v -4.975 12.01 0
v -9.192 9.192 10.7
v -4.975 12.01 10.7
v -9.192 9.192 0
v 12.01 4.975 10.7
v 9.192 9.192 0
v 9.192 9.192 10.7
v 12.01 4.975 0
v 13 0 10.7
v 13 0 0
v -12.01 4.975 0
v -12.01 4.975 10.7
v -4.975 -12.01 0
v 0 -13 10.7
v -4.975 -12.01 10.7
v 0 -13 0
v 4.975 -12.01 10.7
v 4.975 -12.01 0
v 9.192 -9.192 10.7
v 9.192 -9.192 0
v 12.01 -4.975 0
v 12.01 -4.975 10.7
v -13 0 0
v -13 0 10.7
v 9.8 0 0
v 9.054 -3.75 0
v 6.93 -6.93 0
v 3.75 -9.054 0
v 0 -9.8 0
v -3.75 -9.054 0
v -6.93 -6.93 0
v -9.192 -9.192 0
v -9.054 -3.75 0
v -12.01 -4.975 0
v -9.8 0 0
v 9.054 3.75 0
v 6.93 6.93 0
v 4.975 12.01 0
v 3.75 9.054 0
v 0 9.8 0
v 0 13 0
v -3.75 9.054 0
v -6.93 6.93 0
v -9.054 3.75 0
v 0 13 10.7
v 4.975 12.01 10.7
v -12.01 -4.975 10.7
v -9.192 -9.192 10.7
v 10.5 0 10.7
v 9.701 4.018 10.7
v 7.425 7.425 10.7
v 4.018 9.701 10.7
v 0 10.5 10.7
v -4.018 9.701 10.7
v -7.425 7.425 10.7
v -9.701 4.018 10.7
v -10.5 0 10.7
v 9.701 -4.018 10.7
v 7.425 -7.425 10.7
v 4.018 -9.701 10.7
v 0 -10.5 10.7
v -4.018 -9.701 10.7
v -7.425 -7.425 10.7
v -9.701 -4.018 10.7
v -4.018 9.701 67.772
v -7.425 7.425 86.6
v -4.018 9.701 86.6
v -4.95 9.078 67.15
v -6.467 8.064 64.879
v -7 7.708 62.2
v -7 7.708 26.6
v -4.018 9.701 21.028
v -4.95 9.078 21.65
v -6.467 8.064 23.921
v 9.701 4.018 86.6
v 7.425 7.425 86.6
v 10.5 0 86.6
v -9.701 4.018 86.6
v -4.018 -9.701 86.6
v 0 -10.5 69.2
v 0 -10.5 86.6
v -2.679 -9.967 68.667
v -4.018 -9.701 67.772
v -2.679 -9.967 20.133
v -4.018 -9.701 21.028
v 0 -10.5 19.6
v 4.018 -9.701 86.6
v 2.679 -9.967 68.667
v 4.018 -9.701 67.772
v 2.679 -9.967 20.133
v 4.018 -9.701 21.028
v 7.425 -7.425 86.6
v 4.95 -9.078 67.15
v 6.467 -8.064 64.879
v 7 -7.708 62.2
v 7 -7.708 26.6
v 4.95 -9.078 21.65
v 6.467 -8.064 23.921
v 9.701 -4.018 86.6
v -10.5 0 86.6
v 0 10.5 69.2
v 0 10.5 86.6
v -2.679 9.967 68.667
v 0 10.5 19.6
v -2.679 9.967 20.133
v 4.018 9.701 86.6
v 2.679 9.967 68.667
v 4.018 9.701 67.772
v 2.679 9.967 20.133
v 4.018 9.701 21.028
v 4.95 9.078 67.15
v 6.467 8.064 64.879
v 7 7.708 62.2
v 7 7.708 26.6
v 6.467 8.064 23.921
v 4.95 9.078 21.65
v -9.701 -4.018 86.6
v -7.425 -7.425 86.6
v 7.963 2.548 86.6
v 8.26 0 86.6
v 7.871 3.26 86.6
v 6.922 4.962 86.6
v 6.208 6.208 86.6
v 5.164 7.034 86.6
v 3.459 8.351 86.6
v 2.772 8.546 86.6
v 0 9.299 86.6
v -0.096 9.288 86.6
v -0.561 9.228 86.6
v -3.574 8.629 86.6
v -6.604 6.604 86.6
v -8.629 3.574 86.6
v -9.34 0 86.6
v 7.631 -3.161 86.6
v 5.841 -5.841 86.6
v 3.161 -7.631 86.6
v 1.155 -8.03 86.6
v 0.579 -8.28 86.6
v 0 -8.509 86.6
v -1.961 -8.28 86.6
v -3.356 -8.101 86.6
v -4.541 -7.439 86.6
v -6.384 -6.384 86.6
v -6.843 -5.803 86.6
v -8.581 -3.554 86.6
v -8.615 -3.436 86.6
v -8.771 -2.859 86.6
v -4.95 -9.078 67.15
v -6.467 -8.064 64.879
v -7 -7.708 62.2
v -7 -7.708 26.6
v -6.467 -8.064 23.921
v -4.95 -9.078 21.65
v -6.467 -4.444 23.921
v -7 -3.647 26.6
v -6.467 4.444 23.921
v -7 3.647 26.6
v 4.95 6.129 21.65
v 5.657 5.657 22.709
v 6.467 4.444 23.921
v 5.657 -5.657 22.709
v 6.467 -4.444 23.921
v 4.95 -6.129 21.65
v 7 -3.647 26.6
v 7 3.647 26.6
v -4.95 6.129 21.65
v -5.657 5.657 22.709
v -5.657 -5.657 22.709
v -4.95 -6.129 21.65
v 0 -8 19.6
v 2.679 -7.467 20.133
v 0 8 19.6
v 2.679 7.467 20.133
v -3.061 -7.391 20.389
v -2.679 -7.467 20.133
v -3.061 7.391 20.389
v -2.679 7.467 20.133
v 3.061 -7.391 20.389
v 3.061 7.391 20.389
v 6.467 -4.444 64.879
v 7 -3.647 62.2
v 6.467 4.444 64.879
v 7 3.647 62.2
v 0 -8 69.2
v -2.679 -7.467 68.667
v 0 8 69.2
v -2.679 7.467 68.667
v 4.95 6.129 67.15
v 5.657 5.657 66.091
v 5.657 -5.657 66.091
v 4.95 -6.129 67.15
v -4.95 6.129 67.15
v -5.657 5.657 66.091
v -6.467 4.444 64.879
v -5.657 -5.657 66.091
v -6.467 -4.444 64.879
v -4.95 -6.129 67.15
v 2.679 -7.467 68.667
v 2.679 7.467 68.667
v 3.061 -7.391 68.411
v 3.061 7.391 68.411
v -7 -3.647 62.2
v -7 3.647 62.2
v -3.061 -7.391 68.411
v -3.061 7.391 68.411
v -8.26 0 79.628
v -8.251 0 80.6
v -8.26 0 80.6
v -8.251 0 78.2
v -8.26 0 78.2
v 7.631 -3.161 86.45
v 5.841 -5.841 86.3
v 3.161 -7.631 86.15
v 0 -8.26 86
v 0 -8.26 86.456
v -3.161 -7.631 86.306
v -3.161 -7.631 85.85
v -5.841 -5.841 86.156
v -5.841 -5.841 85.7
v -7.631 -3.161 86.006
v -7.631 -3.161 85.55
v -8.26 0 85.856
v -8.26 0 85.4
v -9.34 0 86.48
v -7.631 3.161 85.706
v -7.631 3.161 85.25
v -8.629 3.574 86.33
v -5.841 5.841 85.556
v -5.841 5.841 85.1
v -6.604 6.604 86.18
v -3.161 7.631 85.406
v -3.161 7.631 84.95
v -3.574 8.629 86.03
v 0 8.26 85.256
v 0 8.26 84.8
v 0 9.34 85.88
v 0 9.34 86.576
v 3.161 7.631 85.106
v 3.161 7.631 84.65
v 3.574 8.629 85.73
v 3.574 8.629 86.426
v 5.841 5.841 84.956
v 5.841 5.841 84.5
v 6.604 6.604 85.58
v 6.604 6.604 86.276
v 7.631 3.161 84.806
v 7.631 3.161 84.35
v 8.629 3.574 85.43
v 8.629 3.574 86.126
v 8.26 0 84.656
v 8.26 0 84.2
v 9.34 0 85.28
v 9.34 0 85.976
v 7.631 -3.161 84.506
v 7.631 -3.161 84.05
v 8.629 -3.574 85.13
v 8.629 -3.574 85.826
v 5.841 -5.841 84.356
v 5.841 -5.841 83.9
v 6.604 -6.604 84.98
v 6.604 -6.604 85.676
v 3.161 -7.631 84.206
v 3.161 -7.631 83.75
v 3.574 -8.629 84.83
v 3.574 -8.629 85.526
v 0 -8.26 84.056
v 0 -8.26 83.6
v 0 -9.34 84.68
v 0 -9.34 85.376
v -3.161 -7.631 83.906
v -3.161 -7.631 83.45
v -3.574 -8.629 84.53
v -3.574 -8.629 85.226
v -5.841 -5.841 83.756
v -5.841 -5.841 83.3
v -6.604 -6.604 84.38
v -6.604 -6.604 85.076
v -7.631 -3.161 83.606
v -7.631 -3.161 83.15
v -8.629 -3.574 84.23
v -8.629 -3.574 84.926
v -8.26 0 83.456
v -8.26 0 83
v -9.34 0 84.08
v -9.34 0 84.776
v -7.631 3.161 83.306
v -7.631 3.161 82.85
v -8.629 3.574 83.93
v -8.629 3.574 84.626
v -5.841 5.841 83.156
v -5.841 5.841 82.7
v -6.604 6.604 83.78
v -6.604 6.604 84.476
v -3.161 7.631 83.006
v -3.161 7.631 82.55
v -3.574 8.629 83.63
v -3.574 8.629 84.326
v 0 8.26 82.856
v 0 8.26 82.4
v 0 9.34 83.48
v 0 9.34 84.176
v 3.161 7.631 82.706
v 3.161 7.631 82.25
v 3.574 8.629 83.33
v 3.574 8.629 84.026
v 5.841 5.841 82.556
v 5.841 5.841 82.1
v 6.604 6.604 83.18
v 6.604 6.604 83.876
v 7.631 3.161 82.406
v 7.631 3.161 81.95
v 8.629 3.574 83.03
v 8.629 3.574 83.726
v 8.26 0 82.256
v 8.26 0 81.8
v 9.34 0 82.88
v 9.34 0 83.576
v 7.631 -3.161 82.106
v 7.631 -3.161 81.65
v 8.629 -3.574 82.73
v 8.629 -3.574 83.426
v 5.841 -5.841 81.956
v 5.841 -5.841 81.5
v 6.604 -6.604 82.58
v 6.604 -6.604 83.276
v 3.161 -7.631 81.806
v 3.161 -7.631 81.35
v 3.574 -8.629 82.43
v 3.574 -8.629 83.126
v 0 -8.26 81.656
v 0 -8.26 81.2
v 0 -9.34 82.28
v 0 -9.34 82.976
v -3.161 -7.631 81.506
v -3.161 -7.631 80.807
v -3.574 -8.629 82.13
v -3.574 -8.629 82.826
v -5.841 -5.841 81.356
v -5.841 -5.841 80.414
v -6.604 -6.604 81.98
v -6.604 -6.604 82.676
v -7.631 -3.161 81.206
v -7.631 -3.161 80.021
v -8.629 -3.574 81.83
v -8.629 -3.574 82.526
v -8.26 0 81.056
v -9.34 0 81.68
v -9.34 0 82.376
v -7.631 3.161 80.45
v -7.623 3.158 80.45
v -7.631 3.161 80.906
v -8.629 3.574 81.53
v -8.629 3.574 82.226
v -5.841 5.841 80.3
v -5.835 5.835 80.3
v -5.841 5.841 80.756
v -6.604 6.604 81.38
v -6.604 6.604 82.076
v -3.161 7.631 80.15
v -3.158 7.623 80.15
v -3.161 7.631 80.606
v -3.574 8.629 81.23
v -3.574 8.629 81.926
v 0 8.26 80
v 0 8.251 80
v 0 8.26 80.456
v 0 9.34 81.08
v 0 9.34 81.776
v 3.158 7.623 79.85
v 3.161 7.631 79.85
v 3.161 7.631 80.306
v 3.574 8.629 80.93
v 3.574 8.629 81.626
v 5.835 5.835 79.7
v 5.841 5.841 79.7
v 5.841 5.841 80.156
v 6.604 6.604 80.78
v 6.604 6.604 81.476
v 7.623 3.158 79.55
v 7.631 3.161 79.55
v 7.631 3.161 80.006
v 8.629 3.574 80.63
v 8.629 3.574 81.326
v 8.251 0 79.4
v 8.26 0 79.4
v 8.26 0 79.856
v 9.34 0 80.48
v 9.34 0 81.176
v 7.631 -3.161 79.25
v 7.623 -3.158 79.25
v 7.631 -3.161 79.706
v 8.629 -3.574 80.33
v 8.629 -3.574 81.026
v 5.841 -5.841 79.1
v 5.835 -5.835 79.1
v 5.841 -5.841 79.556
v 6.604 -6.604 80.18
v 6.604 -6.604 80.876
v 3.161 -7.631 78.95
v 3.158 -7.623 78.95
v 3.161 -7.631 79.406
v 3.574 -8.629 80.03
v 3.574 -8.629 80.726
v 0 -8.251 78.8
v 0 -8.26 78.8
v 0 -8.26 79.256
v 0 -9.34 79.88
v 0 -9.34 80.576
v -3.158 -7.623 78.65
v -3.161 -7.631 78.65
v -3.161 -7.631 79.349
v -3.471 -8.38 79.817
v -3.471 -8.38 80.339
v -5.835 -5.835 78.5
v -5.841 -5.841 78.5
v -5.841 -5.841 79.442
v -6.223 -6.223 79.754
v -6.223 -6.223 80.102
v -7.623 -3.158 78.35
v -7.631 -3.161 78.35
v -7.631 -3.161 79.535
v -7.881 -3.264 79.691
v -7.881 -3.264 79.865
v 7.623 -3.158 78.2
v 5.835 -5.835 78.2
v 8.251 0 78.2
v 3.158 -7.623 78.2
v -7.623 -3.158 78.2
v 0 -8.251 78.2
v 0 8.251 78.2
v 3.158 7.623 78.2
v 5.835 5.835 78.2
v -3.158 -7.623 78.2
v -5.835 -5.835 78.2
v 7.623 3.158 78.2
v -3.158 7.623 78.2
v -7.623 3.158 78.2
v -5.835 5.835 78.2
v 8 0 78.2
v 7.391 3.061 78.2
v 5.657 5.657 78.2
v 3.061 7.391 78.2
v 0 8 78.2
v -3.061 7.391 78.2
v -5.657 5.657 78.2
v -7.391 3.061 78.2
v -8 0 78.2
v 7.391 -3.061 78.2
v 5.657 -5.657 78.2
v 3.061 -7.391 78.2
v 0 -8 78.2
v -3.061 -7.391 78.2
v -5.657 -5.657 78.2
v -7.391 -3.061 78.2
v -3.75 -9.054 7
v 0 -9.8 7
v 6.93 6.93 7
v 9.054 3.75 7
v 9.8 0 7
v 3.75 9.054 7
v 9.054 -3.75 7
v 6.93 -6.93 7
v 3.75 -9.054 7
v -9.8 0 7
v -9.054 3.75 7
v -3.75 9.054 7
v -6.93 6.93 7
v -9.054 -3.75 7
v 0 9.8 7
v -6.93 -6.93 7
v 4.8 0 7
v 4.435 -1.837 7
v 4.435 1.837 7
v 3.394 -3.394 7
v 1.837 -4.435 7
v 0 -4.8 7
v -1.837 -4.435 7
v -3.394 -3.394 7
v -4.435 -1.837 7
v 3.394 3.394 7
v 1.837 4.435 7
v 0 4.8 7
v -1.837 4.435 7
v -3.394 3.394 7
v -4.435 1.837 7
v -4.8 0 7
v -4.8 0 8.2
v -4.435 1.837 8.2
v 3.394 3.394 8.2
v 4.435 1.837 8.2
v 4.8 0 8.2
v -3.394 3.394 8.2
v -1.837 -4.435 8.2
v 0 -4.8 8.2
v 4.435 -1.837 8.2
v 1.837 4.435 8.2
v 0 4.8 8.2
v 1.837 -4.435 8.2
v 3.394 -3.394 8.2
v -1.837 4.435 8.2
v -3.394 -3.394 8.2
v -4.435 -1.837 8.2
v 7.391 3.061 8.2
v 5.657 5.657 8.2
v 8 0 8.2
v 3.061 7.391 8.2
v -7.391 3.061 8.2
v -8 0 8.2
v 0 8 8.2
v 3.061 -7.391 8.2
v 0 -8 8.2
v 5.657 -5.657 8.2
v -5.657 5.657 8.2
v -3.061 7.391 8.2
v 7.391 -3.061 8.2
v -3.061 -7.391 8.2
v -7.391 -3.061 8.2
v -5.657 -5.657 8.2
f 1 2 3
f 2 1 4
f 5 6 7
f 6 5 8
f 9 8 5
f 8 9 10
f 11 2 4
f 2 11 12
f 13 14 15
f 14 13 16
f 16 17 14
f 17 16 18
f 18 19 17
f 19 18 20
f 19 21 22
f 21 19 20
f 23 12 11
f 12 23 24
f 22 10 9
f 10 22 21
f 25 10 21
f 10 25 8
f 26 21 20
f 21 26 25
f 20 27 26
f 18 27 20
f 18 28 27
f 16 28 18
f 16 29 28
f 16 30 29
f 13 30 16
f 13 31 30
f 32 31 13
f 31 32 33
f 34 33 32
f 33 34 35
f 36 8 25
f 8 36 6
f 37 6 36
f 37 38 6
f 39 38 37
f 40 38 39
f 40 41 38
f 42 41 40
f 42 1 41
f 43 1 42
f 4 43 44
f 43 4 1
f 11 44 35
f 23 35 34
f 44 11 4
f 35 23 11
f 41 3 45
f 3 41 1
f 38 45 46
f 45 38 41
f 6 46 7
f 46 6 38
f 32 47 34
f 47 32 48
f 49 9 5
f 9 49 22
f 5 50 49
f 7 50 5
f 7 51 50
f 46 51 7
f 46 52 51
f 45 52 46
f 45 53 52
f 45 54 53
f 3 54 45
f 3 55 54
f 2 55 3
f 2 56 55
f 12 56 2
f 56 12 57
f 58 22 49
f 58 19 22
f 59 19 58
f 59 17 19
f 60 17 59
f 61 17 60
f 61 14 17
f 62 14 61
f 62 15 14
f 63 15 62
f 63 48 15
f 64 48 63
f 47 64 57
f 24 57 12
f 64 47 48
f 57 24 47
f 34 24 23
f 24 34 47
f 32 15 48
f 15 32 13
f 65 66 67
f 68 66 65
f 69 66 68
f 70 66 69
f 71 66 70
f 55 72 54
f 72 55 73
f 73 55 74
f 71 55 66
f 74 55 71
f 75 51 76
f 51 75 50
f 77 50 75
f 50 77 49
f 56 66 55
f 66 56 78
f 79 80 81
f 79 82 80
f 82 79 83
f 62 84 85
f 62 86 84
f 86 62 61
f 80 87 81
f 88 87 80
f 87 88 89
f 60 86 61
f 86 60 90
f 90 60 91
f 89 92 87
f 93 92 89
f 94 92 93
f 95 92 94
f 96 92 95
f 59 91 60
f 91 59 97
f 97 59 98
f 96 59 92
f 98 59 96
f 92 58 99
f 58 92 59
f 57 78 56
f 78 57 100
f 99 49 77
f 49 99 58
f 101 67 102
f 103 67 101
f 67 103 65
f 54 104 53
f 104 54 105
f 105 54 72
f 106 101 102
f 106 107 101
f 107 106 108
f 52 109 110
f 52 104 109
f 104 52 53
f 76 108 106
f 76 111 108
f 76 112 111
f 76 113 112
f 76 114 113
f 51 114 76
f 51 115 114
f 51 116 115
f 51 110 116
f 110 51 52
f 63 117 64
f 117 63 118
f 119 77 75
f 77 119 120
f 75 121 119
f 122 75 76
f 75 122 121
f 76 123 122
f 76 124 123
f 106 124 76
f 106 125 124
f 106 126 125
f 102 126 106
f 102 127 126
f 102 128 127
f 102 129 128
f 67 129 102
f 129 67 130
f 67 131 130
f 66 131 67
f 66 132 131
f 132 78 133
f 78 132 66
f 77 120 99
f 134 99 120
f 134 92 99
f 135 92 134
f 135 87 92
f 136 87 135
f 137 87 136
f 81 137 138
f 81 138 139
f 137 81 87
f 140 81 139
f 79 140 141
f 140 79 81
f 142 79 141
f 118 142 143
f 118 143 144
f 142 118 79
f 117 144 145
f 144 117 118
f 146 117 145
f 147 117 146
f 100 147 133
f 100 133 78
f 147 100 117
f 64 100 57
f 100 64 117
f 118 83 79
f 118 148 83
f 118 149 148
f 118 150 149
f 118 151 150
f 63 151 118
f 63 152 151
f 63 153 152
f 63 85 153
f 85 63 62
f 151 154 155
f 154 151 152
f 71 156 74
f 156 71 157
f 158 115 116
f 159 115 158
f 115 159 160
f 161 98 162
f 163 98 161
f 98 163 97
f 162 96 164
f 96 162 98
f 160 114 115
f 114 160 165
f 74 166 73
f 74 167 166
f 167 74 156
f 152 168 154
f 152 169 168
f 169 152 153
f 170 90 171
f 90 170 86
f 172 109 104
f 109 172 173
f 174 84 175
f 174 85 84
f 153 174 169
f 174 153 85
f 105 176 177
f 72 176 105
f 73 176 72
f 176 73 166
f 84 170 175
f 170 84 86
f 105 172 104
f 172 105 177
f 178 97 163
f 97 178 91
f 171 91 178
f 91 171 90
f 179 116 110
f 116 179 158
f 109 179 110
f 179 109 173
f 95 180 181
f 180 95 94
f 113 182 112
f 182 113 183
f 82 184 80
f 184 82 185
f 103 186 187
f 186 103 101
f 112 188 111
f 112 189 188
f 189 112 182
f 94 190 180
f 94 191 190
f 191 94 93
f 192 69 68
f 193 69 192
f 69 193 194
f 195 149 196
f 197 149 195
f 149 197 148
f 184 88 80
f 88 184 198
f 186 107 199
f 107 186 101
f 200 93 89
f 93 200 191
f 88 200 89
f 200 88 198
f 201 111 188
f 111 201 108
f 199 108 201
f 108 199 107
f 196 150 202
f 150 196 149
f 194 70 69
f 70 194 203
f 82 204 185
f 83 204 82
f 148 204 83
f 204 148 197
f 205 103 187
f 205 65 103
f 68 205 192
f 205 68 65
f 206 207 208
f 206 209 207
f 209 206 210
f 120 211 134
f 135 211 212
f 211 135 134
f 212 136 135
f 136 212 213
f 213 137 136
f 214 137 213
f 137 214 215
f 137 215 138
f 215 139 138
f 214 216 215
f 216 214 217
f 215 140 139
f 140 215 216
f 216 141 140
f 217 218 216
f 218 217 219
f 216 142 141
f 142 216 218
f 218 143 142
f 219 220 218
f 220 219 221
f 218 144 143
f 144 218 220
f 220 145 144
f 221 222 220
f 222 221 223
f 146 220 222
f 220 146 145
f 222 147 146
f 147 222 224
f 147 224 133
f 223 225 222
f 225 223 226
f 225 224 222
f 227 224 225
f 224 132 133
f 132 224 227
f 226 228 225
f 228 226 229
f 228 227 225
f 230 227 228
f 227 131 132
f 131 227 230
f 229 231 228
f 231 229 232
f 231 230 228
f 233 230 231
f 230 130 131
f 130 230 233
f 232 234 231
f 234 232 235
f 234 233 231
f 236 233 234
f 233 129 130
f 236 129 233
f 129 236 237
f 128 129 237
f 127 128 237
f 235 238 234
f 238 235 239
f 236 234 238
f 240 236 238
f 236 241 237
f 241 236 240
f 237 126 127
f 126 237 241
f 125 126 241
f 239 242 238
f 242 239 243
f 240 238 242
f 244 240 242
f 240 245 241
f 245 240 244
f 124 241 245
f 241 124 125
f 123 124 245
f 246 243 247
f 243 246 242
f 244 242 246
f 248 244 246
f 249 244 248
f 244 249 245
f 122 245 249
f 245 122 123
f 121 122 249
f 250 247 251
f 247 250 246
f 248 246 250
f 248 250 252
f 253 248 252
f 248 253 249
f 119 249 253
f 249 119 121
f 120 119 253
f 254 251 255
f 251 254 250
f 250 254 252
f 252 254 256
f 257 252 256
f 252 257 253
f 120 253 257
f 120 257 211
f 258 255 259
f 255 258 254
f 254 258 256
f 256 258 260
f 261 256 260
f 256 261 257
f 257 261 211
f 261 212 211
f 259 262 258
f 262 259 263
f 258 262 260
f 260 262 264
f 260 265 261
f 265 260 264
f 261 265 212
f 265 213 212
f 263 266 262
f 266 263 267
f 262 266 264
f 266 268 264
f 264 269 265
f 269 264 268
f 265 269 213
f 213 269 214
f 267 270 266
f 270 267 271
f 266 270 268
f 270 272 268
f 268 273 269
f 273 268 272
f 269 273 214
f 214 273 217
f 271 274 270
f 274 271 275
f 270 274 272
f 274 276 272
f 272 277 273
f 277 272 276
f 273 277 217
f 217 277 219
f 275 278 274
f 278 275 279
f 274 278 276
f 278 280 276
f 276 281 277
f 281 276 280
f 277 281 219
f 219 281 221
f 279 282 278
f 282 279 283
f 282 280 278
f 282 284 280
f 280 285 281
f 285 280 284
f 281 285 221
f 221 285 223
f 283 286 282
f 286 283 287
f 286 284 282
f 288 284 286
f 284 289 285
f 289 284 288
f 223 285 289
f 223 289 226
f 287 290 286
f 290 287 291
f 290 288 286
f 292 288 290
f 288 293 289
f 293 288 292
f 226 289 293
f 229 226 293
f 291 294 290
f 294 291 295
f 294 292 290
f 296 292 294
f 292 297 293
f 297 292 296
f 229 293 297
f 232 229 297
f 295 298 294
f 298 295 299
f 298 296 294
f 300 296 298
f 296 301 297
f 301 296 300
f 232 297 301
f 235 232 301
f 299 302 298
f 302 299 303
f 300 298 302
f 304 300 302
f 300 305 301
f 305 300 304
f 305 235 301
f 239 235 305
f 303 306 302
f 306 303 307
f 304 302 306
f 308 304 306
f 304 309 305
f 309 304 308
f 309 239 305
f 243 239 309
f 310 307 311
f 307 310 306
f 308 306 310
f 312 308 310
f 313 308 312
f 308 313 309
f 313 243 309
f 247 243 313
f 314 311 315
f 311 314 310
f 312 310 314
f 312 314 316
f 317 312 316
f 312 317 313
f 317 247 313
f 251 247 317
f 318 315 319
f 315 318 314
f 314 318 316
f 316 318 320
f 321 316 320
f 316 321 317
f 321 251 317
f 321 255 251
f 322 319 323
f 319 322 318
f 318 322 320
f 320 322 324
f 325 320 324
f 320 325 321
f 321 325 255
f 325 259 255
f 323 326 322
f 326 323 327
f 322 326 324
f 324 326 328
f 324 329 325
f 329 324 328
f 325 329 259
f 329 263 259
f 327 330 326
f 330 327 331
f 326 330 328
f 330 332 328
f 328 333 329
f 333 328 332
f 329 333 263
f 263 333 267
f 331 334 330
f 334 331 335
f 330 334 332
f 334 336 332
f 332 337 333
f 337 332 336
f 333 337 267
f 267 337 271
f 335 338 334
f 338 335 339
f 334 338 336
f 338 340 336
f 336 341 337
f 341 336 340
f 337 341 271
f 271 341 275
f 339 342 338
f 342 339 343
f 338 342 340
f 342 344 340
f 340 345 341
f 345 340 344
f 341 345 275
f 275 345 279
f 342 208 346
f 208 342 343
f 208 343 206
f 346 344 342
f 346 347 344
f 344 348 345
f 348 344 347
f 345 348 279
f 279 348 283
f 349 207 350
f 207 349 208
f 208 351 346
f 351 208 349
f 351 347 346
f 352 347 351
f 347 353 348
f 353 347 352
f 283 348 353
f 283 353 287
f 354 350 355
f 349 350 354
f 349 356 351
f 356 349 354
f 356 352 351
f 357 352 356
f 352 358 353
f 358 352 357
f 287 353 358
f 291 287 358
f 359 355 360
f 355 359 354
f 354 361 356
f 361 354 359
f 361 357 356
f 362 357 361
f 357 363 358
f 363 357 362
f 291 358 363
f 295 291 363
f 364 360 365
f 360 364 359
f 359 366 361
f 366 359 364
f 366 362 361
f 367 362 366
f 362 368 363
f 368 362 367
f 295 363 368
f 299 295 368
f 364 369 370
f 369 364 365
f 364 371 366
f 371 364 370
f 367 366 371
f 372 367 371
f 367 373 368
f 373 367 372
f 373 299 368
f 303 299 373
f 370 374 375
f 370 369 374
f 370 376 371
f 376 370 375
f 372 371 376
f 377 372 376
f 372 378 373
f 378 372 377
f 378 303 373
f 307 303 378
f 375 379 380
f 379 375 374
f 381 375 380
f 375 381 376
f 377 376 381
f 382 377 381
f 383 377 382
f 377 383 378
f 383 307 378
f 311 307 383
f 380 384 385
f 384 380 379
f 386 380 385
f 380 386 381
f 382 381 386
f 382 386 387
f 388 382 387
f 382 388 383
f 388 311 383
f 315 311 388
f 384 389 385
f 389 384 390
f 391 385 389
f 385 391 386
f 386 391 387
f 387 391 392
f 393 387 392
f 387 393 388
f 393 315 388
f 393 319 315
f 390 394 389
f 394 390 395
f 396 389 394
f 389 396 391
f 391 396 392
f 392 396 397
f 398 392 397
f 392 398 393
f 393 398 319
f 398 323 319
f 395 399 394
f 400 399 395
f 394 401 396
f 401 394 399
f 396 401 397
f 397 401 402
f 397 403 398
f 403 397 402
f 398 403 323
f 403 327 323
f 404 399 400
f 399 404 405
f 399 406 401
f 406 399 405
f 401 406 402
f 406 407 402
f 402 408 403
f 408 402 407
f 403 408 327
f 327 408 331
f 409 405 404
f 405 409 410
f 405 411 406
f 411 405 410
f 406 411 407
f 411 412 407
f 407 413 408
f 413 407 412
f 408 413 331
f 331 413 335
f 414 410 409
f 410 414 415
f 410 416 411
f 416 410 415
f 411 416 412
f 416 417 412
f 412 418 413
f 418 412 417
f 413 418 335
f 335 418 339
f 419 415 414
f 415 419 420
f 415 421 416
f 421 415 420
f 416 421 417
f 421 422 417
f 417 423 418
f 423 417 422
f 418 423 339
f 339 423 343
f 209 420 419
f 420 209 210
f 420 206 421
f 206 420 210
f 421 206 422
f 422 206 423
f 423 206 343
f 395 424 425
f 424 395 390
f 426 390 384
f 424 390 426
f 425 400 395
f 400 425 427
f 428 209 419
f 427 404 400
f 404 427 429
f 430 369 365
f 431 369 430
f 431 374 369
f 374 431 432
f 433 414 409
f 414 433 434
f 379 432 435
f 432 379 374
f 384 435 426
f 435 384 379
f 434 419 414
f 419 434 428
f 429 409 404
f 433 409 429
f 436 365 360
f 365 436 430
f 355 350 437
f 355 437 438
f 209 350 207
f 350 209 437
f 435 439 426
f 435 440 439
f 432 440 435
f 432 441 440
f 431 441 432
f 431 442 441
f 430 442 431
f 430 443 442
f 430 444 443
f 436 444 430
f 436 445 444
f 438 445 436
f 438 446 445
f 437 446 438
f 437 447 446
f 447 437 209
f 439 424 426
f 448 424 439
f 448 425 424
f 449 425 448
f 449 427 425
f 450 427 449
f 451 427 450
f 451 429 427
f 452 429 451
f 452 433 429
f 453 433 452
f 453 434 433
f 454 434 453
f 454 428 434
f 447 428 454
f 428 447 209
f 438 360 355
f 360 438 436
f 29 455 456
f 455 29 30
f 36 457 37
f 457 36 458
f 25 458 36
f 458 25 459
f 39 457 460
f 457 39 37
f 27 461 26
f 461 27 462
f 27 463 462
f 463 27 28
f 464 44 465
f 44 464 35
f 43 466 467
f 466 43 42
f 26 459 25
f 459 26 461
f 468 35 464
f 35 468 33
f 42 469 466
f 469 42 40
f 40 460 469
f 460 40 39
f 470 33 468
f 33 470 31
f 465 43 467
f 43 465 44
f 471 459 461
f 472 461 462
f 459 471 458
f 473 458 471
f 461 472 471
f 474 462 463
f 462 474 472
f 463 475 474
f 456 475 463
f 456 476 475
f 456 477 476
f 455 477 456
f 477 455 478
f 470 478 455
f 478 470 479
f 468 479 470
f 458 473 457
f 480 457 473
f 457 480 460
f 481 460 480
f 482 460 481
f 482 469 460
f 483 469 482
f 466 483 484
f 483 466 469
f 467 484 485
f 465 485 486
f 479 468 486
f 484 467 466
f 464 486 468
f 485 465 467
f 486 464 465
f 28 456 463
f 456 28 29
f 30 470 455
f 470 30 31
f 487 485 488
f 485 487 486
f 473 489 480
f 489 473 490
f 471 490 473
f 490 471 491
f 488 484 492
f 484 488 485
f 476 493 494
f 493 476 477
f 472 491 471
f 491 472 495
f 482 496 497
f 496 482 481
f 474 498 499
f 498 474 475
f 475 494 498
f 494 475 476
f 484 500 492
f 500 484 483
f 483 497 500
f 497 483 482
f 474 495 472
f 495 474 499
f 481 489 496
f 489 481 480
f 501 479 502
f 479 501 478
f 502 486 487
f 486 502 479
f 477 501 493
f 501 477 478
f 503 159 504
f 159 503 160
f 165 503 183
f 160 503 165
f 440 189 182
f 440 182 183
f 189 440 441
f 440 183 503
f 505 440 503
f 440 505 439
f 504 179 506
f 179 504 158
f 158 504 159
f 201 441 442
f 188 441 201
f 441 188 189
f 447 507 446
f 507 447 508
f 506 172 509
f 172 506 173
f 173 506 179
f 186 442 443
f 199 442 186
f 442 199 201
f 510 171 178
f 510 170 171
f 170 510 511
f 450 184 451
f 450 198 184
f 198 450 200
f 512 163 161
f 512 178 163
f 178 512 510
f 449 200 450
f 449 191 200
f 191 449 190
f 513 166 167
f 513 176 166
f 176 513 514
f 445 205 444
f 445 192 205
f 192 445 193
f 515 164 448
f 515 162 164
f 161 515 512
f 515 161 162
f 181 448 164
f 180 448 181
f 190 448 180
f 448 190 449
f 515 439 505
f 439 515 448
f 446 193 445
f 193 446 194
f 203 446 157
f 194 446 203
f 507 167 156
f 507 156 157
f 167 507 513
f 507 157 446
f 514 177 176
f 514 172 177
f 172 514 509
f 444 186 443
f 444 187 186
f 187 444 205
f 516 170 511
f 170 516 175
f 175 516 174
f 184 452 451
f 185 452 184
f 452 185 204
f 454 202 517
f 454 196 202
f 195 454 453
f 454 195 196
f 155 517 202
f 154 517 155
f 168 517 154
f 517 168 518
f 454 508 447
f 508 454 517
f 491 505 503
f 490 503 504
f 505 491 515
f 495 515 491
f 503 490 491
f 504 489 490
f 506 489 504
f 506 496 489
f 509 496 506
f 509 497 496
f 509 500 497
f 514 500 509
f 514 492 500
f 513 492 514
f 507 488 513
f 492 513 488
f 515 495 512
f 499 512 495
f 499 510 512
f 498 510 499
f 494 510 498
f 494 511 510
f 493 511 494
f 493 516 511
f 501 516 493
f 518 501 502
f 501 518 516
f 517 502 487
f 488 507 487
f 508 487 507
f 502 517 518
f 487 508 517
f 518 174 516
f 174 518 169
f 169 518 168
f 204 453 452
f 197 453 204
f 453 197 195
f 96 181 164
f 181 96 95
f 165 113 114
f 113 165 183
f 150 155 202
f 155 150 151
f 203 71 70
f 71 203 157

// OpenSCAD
// file: electronic_parts.scad
module slide_switch() {
    l_handles = 19.7;
    e_handles = 0.4;
    e_total = 5.8;
    h_total = 7.6;
    l_block = 10.7;
    h_block = 5;
    l_button = 2.9;
    h_button = 5;
    e_button = 6;
    d_hole = 2.1;
    e_hole = 12.8; // ecart bord à bord, et pas centre à centre
    h_pin = h_total-h_block;
    l_pin = 1.5;
    e_pin = 0.4;
    l_3pins = 7.5;
    $fn = 10;
    module slide_switch_pin() {
        translate([0,e_pin/2,l_pin/2-h_pin])
        rotate([90,0,0]) {
            translate([l_pin/-2,0,0])
            cube([l_pin,h_pin-l_pin/2+0.1,e_pin]);
            cylinder(d=l_pin,h=e_pin);
        }
    }
    color("blue")
    difference() {
        union() {
            translate([l_handles/-2,e_total/-2,h_block-e_handles])
            cube([l_handles,e_total,e_handles]);
            translate([l_block/-2,e_total/-2,0])
            cube([l_block,e_total,h_block]);
            translate([e_button/2-l_button/2,0,0])
            translate([l_button/-2,l_button/-2,h_block-0.1])
            cube([l_button,l_button,h_button+0.1]);
            slide_switch_pin();
            translate([l_3pins/2-l_pin/2,0,0])
            slide_switch_pin();
            translate([l_pin/2-l_3pins/2,0,0])
            slide_switch_pin();
        }
        translate([e_hole/2+d_hole/2,0,h_block-e_handles-0.1])
        cylinder(d=d_hole,h=e_handles+0.2);
        translate([(e_hole/2+d_hole/2)*-1,0,h_block-e_handles-0.1])
        cylinder(d=d_hole,h=e_handles+0.2);
    }
}

module support_board() {
    h_total = 10.5;
    l_block = 10.7;
    h_block = 8.5;
    e_block = 5;
    l_pin = 0.6;
    e_pin = 0.3;
    h_pin = h_total-h_block;
    e_l_pins = 8.3;
    e_h_pins = 3;
    e_calc_l_pins = (e_l_pins-l_pin)/3;
    module support_board_pins() {
        translate([e_pin/-2,l_pin/-2,-h_pin])
        cube([e_pin,l_pin,h_pin+0.1]);
    }
    color("violet")
    union () {
        translate([e_block/-2,l_block/-2,0])
        cube([e_block,l_block,h_block]);
        translate([e_h_pins/-2+e_pin/2,0,0]) {
            translate([0,e_l_pins/-2+l_pin/2,0]) support_board_pins();
            translate([0,e_calc_l_pins/-2,0]) support_board_pins();
            translate([0,e_calc_l_pins/2,0]) support_board_pins();
            translate([0,e_l_pins/2-l_pin/2,0]) support_board_pins();
        }
        translate([e_h_pins/2-e_pin/2,0,0]) {
            translate([0,e_l_pins/-2+l_pin/2,0]) support_board_pins();
            translate([0,e_calc_l_pins/-2,0]) support_board_pins();
            translate([0,e_calc_l_pins/2,0]) support_board_pins();
            translate([0,e_l_pins/2-l_pin/2,0]) support_board_pins();
        }
    }
}

module esp8266_01() {
    l_board = 15;
    h_board = 25;
    e_board = 1.2;
    e_board_block = 0.5;
    h_block = 5;
    l_block = 9.8;
    e_block = 2.5;
    h_pin = 11.4;
    l_pin = 0.6;
    s_pin = 8.4;
    e_h_pins = 3.2;
    e_l_pins = 8.3;
    e_calc_l_pins = (e_l_pins-l_pin)/3;
    module board_pin() {
        translate([l_pin/-2,l_pin/-2,e_block-s_pin])
        cube([l_pin,l_pin,h_pin]);
    }
    color("green")
    union() {
        translate([h_block/-2-e_board_block,l_board/-2,e_block])
        cube([h_board,l_board,e_board]);
        translate([h_block/-2,l_block/-2,0])
        cube([h_block,l_block,e_block+0.1]);
        translate([e_h_pins/-2+l_pin/2,0,0]) {
            translate([0,e_l_pins/-2+l_pin/2,0]) board_pin();
            translate([0,e_calc_l_pins/-2,0]) board_pin();
            translate([0,e_calc_l_pins/2,0]) board_pin();
            translate([0,e_l_pins/2-l_pin/2,0]) board_pin();
        }
        translate([e_h_pins/2-l_pin/2,0,0]) {
            translate([0,e_l_pins/-2+l_pin/2,0]) board_pin();
            translate([0,e_calc_l_pins/-2,0]) board_pin();
            translate([0,e_calc_l_pins/2,0]) board_pin();
            translate([0,e_l_pins/2-l_pin/2,0]) board_pin();
        }
    }
}

module battery() {
    d_battery = 17;
    h_battery = 34;
    color("red")
    cylinder(d=d_battery,h=h_battery);
}

module shock_sensor() {
    d_sensor = 5;
    h_sensor = 11;
    l_pin = 0.6;
    h_pin = 2;
    color("orange")
    union() {
        cylinder(d=d_sensor,h=h_sensor);
        translate([l_pin/-2,l_pin/-2-1,-h_pin])
        cube([l_pin,l_pin,h_pin+0.1]);
        translate([l_pin/-2,l_pin/-2+1,-h_pin])
        cube([l_pin,l_pin,h_pin+0.1]);
    }
}
// main file
// ####################################
// INPUTS #############################
// ####################################

$fn = 16;

mode = "part"; // ["part", "compose"]
part = "magnet holder"; // ["magnet holder", "electric stage"]
eclate = false;
electric = false;

// ####################################
// GLOBAL PARAMETERS ##################
// ####################################

function FT_tube_DO() = 26;
function FT_tube_DI() = 21;
function FT_tube_T() = 1.6;

function magnet_DO() = 19.6;
function magnet_H() = 7;
function magnet_storage_H() = 70;
function magnet_storage_TR() = 16;
function magnet_storage_DO() = 14;

function slice_thick() = 1.2;

function intern_D() = 16;
function rope_D() = 9.6;


function battery_D() = 18;
function battery_L() = 37;
function battery_open_TR() = 2.8;
function battery_plate_T() = 4;
function battery_plate_TR() = 7;
function battery_led_H() = 5;
function battery_led_T() = 11;
function battery_wires_L() = 7.4;

function thread_L() = 6;
function thread_P() = 2.4;
function thread_R() = 8.5;
function h_th_correction() = 10.2;
function d_th_correction() = 17.4;

// ####################################
// INCLUDES ###########################
// ####################################

include <electronic_parts.scad>
include <Thread_Library.scad>

// ####################################
// HELPERS ############################
// ####################################

module thread() {
    trapezoidThread(
        length=thread_L(),
        pitch=thread_P(),
        pitchRadius=thread_R(),
        stepsPerTurn=$fn
    );
}

module thread_negative() {
    trapezoidThreadNegativeSpace(
        length=thread_L(),
        pitch=thread_P(),
        pitchRadius=thread_R(),
        stepsPerTurn=$fn
    );
    //cylinder(d=d_th_correction(),h=h_th_correction(),center=false);
}

// ####################################
// PARTS ##############################
// ####################################

module magnet_holder() {
    out_part_H = magnet_H()+slice_thick()*3;
    hole_bottom = out_part_H+magnet_storage_TR();
    hole_top = out_part_H+magnet_storage_H()-2*slice_thick()-magnet_storage_TR();
    difference() {
        union() {
            cylinder(d=FT_tube_DO(),h=out_part_H+0.1);
            translate([0, 0, out_part_H])
            cylinder(d=FT_tube_DI(),h=magnet_holder_H()-out_part_H);
        }
        translate([0,0,-0.1]) cylinder(d=magnet_DO(),h=magnet_H()+0.1);
        translate([0,0,magnet_H()-0.1]) cylinder(d=rope_D(),h=slice_thick()+0.2);
        translate([0,0,out_part_H-2*slice_thick()])
        cylinder(d=intern_D(),h=magnet_storage_H()+0.1);
        translate([0,FT_tube_DI()/-2-0.05,0])
        rotate([-90,0,0]) {
            translate([0,-hole_bottom,0])
            cylinder(d=magnet_storage_DO(),h=FT_tube_DI()+0.1);
            translate([0,-hole_top,0])
            cylinder(d=magnet_storage_DO(),h=FT_tube_DI()+0.1);
        }
        translate([magnet_storage_DO()/-2,FT_tube_DI()/-2-0.05,hole_bottom])
        cube([magnet_storage_DO(),FT_tube_DI()+0.1,hole_top-hole_bottom]);
        translate([0,0,magnet_holder_H()])
        rotate([180,0,0])
        thread_negative();
        if (eclate) {
            translate([0,0,-0.05])
            cube([FT_tube_DO()/2+0.05,FT_tube_DO()/2+0.05,magnet_holder_H()+0.1]);
        }
    }
}

function magnet_holder_H() =
    magnet_H()+slice_thick()+magnet_storage_H()+thread_L()+thread_P();

module electric_stage() {
    //
    battery_lvl = thread_L()+battery_led_H()+2*slice_thick();
    battery_cap_H = battery_L()+2*slice_thick();
    plate_cut_D = FT_tube_DI()/2-battery_plate_TR()+0.05;
    //
    //
    translate([0,0,-0.1])
    difference() {
        union() {
            translate([0,0,0.1]) thread();
            translate([0,0,thread_L()])
            cylinder(d=FT_tube_DI(),h=battery_led_H()+3*slice_thick()+battery_L());
            //
            //
        }
        translate([FT_tube_DI()/-2-0.05,battery_led_T()/-2,thread_L()+slice_thick()])
        cube([FT_tube_DI()+0.1,battery_led_T(),battery_led_H()]);
        translate([0,0,battery_lvl]) {
            cylinder(d=battery_D(),h=battery_L());
            translate([battery_open_TR(),FT_tube_DI()/-2-0.05,0])
            cube([FT_tube_DI()/2+0.05,FT_tube_DI()+0.1,battery_L()]);
            translate([battery_plate_TR(),battery_plate_T()/-2,-slice_thick()-0.1])
            cube([plate_cut_D,battery_plate_T(),battery_cap_H+0.2]);
            translate([0,0,-slice_thick()-0.05])
            intersection() {
                difference() {
                    cylinder(d=FT_tube_DI()+0.05,h=battery_cap_H+0.1);
                    translate([0,0,-0.1])
                    cylinder(d=battery_D()-0.05,h=battery_cap_H+0.2);
                }
                translate([FT_tube_DI()/-2-0.05,battery_wires_L()/-2,0])
                cube([FT_tube_DI()/2+0.05,battery_wires_L(),battery_cap_H+0.1]);
            }
        }
        //
        //
        // TODO : connector for esp board
        //
        // TODO : connector for the tail
        //
    }
    if (electric) {
        //
        translate([0,0,battery_lvl+1]) battery();
        //
    }
}

function electric_stage_H() = // TODO : add base anchor and connector stuff
    thread_L()+battery_led_H()+2*slice_thick()+battery_L()+     0       ;

// ####################################
// COMPOSE ############################
// ####################################

if (mode == "part") {
    if (part == "magnet holder") { magnet_holder(); }
    else if (part == "electric stage") { electric_stage(); }
    //
    //
}
else if (mode == "compose") {
    //
    tube_tr = magnet_H()+3*slice_thick()+0.2;
    tube_H = 150;
    //
    //
    magnet_holder();
    color("purple")
    translate([0,0,tube_tr])
    difference() {
        cylinder(d=FT_tube_DO(),h=tube_H);
        translate([0,0,-0.05]) {
            cylinder(d=FT_tube_DI()+0.2,h=tube_H+0.1);
            translate([0,FT_tube_DO()/-2-0.1,0])
            cube([FT_tube_DO()/2+0.1,FT_tube_DO()+0.2,tube_H+0.1]);
            rotate([0,0,70])
            cube([FT_tube_DO()/2+0.1,FT_tube_DO()/2+0.1,tube_H+0.1]);
        }
    }
    //
    translate([0,0,magnet_holder_H()-thread_L()+0.2])
    electric_stage();
    //
    //
}
